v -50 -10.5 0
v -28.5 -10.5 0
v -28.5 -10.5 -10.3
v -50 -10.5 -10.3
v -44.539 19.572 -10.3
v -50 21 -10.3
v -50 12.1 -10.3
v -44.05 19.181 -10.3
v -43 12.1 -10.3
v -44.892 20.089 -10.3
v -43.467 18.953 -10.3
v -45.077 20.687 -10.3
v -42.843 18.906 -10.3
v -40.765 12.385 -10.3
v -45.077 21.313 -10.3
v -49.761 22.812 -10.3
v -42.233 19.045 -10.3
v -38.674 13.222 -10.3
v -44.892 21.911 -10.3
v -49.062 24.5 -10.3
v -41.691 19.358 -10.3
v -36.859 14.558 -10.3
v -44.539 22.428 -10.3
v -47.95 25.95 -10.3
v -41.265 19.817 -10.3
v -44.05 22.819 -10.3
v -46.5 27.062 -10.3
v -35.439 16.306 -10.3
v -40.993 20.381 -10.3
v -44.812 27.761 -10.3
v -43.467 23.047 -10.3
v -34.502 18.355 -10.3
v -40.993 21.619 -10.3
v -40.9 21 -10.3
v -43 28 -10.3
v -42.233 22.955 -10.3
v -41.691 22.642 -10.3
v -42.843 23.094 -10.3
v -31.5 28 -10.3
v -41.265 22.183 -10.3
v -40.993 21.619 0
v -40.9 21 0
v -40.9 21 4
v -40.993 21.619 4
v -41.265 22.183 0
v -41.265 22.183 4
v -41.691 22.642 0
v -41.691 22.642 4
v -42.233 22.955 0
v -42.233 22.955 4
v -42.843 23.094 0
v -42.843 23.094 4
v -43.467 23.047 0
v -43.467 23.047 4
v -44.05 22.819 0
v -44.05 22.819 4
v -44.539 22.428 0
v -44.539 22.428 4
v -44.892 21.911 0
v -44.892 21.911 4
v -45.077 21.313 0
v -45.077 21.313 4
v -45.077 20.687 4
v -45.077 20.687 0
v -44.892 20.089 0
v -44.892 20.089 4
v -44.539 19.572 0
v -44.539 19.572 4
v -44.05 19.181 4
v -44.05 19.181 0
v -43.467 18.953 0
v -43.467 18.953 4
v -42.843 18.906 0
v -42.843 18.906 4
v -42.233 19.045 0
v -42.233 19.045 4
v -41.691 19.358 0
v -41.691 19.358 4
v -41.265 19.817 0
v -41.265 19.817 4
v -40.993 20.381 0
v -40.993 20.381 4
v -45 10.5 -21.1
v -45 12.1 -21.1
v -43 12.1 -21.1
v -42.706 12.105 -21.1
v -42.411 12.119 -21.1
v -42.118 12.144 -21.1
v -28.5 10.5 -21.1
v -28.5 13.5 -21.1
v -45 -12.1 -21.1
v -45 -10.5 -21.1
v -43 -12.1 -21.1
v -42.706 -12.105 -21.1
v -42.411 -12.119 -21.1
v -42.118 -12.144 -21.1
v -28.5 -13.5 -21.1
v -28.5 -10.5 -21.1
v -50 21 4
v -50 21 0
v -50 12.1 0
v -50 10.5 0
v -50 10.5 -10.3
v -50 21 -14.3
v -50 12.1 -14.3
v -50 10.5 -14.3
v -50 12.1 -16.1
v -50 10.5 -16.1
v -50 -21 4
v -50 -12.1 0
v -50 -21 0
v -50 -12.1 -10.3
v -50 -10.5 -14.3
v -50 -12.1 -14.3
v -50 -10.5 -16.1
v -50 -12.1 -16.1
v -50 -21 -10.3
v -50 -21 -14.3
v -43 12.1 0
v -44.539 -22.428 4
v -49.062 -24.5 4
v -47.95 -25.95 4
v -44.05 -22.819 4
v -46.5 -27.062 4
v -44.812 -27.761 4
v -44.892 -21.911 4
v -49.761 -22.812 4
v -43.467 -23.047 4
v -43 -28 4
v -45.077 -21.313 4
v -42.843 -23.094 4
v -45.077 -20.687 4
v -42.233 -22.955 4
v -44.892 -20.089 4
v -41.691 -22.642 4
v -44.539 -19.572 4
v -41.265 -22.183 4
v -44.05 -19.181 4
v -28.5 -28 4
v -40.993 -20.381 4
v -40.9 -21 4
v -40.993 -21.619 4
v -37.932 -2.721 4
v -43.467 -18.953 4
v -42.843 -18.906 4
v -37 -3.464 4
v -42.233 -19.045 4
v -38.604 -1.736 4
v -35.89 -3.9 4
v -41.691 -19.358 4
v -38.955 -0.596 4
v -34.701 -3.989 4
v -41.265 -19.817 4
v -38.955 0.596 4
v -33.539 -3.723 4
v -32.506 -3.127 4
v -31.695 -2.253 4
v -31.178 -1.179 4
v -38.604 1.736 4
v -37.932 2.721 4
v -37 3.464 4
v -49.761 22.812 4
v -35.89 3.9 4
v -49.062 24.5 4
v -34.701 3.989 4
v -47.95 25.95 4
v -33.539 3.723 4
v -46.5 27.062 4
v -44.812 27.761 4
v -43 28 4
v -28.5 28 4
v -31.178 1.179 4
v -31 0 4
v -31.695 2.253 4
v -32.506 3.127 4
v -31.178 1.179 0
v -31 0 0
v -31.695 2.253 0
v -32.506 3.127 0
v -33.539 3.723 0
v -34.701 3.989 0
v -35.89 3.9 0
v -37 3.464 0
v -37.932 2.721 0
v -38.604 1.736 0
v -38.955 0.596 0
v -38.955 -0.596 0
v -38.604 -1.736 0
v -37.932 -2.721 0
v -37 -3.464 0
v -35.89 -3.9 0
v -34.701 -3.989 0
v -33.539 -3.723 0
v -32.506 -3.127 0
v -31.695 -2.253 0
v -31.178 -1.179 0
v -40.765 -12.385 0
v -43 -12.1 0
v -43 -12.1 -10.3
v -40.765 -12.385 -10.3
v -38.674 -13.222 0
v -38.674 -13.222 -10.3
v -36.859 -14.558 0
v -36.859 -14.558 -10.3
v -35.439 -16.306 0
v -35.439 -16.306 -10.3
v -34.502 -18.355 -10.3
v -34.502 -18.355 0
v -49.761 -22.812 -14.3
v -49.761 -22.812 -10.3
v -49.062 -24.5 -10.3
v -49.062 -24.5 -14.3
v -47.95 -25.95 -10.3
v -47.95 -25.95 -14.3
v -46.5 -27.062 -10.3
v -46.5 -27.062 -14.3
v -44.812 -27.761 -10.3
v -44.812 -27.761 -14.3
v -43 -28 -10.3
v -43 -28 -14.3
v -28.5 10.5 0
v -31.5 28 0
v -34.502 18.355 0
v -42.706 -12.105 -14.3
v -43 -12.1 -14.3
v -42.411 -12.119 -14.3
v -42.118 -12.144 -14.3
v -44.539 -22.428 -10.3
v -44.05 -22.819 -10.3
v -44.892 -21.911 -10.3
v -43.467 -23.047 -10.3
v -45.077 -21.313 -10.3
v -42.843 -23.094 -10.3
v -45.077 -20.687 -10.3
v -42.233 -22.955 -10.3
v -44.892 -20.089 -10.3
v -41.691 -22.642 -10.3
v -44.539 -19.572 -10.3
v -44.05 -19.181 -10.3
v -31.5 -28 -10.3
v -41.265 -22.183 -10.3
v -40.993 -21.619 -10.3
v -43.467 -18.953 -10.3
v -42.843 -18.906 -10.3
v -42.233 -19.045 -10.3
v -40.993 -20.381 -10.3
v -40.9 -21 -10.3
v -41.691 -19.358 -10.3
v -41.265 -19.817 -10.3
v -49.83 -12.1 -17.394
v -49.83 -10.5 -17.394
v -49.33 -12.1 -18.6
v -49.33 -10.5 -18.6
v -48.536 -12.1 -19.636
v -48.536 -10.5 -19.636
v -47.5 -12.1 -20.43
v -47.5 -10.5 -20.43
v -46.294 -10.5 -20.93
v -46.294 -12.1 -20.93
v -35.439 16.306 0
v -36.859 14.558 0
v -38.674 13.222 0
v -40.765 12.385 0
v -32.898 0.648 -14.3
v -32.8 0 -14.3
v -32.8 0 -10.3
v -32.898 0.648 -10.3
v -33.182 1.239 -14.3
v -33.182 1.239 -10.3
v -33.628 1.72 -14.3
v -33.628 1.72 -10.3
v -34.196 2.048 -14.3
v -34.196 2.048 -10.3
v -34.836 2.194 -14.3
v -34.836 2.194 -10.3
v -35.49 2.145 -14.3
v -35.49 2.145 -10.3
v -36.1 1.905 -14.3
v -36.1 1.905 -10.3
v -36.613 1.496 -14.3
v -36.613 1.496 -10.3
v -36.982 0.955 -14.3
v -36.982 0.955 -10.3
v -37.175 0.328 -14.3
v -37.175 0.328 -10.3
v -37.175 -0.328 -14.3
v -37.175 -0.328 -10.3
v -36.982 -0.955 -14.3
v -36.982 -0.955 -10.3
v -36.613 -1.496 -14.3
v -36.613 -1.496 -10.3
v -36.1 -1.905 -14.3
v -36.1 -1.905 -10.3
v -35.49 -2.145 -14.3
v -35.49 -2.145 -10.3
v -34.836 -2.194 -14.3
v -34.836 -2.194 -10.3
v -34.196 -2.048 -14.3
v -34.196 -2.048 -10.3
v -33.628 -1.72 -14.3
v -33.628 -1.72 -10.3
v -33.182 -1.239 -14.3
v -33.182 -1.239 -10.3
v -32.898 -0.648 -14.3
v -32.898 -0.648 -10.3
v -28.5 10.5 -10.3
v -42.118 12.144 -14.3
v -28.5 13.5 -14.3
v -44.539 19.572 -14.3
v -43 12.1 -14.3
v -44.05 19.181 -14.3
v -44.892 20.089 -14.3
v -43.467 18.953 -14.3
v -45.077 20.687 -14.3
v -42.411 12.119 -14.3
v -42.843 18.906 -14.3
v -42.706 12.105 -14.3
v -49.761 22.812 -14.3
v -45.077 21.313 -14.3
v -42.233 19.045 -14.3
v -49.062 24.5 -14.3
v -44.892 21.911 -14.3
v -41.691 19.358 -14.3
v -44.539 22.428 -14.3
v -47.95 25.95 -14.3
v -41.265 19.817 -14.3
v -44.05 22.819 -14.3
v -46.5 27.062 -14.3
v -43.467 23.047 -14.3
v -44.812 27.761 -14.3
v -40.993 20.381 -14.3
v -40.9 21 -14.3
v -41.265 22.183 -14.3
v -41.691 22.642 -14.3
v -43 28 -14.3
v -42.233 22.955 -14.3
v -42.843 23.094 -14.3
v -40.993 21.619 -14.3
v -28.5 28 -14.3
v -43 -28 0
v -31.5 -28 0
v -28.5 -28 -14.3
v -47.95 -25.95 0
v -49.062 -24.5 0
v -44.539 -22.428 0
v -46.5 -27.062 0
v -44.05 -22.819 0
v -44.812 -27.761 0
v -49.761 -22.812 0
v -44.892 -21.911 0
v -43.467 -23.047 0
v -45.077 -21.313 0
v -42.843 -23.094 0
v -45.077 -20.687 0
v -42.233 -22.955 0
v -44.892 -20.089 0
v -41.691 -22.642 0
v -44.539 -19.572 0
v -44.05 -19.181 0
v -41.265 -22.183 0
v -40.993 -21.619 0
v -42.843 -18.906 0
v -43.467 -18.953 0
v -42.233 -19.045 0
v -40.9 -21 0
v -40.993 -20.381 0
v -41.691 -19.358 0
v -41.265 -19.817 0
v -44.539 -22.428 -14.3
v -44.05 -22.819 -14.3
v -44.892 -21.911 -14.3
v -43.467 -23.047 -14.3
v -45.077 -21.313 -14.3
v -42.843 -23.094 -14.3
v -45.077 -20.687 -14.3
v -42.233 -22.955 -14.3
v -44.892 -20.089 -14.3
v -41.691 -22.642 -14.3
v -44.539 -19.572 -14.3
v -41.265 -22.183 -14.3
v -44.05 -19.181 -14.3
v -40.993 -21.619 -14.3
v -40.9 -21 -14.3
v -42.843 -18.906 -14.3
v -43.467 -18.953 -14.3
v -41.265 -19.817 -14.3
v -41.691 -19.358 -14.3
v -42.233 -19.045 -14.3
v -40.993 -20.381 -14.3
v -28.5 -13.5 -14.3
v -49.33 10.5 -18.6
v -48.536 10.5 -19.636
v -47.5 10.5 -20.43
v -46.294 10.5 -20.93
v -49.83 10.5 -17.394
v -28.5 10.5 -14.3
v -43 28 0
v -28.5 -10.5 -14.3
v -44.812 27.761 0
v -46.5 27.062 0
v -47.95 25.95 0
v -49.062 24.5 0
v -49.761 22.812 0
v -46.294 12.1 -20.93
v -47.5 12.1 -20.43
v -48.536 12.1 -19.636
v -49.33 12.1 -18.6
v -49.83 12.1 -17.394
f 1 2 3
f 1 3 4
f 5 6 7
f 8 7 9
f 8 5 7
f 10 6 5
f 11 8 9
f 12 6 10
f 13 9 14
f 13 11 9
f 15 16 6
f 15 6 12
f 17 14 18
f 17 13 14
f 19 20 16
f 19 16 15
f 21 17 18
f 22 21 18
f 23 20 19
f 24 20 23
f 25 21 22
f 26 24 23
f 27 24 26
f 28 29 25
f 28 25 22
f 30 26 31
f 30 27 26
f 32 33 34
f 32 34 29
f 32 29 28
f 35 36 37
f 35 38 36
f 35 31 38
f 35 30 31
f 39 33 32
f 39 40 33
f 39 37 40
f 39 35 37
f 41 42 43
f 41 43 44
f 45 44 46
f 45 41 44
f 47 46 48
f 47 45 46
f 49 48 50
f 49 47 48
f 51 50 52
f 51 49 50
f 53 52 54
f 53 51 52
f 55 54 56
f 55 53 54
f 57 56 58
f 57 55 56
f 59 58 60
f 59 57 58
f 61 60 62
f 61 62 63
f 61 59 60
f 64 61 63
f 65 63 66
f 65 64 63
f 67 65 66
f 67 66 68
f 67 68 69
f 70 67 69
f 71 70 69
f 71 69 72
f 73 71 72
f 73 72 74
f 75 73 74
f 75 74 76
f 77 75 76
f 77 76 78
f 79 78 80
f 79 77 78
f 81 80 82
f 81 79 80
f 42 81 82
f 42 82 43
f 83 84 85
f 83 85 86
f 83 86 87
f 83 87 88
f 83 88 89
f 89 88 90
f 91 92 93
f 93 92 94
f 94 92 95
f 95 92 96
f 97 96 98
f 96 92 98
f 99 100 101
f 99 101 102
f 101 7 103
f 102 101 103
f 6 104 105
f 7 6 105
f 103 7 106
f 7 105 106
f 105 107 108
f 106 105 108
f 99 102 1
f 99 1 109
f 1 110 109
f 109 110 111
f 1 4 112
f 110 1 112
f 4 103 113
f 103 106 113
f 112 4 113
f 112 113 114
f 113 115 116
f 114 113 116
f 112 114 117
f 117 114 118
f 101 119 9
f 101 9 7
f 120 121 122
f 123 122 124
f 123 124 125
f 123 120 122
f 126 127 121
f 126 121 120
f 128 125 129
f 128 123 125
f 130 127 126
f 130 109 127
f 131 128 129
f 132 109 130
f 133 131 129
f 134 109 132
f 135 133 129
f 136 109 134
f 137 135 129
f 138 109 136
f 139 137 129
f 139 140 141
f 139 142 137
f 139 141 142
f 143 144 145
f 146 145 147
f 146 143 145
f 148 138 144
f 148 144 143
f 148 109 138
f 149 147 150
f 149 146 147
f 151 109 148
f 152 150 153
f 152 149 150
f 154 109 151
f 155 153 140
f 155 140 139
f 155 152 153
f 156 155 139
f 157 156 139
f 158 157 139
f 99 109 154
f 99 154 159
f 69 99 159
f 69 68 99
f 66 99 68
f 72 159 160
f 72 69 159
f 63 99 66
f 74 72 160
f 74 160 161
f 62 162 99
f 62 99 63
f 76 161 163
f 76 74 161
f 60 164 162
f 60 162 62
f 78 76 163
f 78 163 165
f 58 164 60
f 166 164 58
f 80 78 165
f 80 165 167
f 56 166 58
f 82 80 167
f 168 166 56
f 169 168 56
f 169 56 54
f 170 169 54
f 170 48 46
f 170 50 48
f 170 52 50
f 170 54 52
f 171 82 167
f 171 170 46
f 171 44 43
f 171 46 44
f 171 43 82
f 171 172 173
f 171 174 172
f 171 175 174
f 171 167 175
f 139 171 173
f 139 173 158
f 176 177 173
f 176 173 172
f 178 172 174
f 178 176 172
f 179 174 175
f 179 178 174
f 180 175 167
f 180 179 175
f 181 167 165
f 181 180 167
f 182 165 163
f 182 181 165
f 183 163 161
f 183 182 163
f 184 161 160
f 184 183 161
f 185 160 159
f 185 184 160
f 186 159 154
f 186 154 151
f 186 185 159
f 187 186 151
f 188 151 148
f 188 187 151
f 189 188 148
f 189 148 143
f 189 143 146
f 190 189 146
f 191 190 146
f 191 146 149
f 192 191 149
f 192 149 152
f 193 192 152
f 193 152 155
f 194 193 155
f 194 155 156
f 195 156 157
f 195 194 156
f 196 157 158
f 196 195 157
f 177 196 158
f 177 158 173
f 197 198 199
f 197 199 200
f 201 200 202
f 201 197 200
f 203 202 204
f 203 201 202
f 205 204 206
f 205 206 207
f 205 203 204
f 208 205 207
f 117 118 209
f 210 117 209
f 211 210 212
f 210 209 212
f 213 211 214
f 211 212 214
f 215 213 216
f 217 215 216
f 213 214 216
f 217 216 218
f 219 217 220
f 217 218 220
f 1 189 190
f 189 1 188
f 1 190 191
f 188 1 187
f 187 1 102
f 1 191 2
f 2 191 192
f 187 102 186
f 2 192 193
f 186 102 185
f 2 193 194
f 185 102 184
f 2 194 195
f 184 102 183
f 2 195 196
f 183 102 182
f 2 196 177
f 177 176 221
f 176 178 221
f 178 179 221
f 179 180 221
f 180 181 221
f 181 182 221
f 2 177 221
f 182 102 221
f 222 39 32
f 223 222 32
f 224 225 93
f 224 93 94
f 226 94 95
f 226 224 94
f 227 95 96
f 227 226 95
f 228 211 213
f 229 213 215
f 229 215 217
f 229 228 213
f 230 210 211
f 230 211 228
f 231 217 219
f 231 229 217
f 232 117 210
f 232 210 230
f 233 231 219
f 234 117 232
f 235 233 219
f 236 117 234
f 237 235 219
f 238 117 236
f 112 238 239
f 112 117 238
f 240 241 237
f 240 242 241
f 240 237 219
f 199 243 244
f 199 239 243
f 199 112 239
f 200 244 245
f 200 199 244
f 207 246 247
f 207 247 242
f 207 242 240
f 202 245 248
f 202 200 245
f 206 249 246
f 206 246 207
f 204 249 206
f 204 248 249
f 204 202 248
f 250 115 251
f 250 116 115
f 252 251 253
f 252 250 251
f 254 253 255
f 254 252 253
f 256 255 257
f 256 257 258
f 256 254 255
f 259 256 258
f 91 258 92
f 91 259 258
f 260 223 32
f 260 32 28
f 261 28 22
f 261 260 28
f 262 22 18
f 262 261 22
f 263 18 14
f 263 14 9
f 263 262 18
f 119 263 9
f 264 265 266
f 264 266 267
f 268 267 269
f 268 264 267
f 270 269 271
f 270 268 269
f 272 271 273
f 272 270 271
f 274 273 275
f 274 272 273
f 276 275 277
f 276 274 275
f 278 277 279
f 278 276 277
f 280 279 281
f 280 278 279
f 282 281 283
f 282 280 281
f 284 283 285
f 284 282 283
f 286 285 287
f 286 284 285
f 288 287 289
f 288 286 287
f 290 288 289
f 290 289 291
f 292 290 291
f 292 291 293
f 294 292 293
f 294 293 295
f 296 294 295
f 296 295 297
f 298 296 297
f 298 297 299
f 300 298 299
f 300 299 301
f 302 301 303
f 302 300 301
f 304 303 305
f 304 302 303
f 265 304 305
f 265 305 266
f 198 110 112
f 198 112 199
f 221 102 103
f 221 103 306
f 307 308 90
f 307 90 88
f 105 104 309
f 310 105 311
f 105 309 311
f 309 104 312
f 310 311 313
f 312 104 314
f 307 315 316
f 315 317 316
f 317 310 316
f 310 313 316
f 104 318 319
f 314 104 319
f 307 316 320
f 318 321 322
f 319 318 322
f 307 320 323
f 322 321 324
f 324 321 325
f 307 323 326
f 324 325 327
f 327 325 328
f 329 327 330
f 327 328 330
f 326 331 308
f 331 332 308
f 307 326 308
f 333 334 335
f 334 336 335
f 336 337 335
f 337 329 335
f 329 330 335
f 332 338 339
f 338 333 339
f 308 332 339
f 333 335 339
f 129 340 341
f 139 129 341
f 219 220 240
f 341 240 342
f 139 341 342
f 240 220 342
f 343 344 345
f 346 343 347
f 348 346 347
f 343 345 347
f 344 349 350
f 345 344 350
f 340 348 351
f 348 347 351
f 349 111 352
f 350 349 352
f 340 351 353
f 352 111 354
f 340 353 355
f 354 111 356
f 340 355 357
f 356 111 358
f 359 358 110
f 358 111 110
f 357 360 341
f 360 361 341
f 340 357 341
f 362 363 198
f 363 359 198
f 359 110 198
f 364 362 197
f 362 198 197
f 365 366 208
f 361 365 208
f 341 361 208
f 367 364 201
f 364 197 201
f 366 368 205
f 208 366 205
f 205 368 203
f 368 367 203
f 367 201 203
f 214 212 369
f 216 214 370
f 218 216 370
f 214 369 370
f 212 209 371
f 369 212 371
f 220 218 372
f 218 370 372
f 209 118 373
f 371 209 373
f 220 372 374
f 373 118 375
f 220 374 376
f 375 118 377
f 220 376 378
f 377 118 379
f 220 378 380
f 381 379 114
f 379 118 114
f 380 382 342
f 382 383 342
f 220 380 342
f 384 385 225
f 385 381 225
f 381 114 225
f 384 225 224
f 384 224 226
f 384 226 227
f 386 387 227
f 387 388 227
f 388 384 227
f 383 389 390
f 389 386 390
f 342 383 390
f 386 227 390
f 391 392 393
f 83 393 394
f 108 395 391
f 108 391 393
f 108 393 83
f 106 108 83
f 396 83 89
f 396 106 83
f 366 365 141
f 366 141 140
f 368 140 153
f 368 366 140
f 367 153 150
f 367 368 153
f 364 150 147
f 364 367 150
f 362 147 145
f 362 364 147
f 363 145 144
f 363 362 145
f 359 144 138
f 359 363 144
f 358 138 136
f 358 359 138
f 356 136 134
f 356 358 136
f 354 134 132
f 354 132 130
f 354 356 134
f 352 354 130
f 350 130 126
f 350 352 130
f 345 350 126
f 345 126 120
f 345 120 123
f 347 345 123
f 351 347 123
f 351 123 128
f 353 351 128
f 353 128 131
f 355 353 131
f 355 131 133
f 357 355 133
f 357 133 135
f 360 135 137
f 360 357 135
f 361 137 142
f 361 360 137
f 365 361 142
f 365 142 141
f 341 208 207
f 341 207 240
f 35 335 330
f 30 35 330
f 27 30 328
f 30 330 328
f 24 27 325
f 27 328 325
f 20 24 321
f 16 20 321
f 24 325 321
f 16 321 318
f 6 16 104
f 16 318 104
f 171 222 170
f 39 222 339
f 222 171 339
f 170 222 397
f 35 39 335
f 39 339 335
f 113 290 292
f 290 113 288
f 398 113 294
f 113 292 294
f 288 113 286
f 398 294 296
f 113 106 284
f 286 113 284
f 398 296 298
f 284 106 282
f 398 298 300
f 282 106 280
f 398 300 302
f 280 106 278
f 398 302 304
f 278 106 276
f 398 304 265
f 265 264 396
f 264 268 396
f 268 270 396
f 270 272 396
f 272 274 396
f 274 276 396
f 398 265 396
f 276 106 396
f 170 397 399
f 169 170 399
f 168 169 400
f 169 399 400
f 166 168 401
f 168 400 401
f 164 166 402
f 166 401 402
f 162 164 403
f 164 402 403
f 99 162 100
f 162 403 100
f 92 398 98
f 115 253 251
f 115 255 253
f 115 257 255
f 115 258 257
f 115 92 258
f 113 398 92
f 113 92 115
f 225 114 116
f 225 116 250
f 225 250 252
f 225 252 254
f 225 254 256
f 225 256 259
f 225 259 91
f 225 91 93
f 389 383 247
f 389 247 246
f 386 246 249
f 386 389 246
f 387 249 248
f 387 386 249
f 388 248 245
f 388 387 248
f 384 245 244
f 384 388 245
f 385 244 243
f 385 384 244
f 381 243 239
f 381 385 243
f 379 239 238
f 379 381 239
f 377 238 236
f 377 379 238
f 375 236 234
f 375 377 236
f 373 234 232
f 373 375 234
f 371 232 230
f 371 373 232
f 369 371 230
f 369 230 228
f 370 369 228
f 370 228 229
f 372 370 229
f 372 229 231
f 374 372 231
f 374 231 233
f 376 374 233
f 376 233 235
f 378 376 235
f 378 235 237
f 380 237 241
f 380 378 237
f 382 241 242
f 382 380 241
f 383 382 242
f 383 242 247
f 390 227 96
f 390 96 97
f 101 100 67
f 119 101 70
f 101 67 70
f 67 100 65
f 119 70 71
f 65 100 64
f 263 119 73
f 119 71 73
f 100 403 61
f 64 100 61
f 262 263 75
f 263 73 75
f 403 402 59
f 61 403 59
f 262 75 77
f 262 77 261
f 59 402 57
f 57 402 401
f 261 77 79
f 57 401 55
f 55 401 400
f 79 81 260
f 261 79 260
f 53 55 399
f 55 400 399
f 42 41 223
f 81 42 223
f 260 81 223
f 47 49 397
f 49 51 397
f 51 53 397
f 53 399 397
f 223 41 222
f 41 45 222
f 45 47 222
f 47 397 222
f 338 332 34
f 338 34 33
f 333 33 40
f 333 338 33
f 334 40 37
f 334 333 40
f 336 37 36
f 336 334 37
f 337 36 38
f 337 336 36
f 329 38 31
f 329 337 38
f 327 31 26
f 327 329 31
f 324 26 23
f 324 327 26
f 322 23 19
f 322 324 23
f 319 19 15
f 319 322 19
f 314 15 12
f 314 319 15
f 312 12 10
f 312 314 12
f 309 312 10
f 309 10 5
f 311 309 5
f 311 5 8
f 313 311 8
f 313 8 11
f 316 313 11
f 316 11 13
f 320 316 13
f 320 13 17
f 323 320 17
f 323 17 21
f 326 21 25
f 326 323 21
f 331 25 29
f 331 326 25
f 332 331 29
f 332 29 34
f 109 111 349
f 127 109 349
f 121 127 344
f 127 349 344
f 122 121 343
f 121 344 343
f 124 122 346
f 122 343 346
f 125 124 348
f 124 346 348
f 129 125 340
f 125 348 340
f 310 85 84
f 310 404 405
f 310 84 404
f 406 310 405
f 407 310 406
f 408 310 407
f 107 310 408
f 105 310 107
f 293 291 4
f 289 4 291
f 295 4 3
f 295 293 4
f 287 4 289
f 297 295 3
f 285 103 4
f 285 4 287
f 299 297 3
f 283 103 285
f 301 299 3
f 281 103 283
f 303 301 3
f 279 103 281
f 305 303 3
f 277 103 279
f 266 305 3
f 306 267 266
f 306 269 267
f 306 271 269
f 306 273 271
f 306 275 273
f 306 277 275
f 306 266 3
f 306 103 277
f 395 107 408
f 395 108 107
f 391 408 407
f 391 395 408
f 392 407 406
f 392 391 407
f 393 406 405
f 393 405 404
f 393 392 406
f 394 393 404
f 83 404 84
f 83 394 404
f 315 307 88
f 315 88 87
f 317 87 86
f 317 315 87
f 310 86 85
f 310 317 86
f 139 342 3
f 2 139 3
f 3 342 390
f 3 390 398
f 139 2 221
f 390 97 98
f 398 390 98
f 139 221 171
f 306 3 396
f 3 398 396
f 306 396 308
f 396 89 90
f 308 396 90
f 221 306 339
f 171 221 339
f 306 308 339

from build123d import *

# Parameters (mm, degrees)
SKETCH_1_R      = 2.1
SKETCH_1_R_2    = 4
EXTRUDE_1_DEPTH = 4
EXTRUDE_2_DEPTH = 10.3
EXTRUDE_START   = -14.3
SKETCH_1_6_R    = 2.1
SKETCH_1_6_R_2  = 2.2
EXTRUDE_3_DEPTH = 4
EXTRUDE_4_DEPTH = 6.8
FILLET_1_R      = 5


with BuildPart() as part:
    # 草图1 → 凸台-拉伸1 (new body)
    with BuildSketch(Plane.XY):
        with BuildLine():
            ThreePointArc((-43, 28), (-47.949747468, 25.949747468), (-50, 21))
            Line((-50, 21), (-50, -21))
            ThreePointArc((-50, -21), (-47.949747468, -25.949747468), (-43, -28))
            Line((-43, -28), (-28.5, -28))
            Line((-28.5, -28), (-28.5, 28))
            Line((-28.5, 28), (-43, 28))
        make_face()
        with Locations((-43, 21)):
            Circle(SKETCH_1_R, mode=Mode.SUBTRACT)
        with Locations((-35, 0)):
            Circle(SKETCH_1_R_2, mode=Mode.SUBTRACT)
        with Locations((-43, -21)):
            Circle(SKETCH_1_R, mode=Mode.SUBTRACT)
    extrude(amount=EXTRUDE_1_DEPTH)

    # 草图1<5> → 凸台-拉伸2 (add)
    with BuildSketch(Plane.XY):
        with BuildLine():
            Line((-43, 12.1), (-50, 12.1))
            Line((-50, 12.1), (-50, 10.5))
            Line((-50, 10.5), (-28.5, 10.5))
            Line((-28.5, 10.5), (-28.5, 28))
            Line((-28.5, 28), (-31.5, 28))
            Line((-31.5, 28), (-34.502137832, 18.354940724))
            ThreePointArc((-34.502137832, 18.354940724), (-37.724160141, 13.832328567), (-43, 12.1))
        make_face()
        with BuildLine():
            Line((-28.5, -10.5), (-50, -10.5))
            Line((-50, -10.5), (-50, -12.1))
            Line((-50, -12.1), (-43, -12.1))
            ThreePointArc((-43, -12.1), (-37.724160141, -13.832328567), (-34.502137832, -18.354940724))
            Line((-34.502137832, -18.354940724), (-31.5, -28))
            Line((-31.5, -28), (-28.5, -28))
            Line((-28.5, -28), (-28.5, -10.5))
        make_face()
    extrude(amount=-EXTRUDE_2_DEPTH)

    # 草图1<6> → 凸台-拉伸3 (add)
    with BuildSketch(Plane.XY.offset(EXTRUDE_START)):
        with BuildLine():
            ThreePointArc((-43, 28), (-47.949747468, 25.949747468), (-50, 21))
            Line((-50, 21), (-50, -21))
            ThreePointArc((-50, -21), (-47.949747468, -25.949747468), (-43, -28))
            Line((-43, -28), (-28.5, -28))
            Line((-28.5, -28), (-28.5, 28))
            Line((-28.5, 28), (-43, 28))
        make_face()
        with Locations((-43, 21)):
            Circle(SKETCH_1_6_R, mode=Mode.SUBTRACT)
        with Locations((-43, -21)):
            Circle(SKETCH_1_6_R, mode=Mode.SUBTRACT)
        with Locations((-35, 0)):
            Circle(SKETCH_1_6_R_2, mode=Mode.SUBTRACT)
    extrude(amount=EXTRUDE_3_DEPTH)

    # 草图1<7> → 凸台-拉伸4 (add)
    with BuildSketch(Plane.XY.offset(EXTRUDE_START)):
        with BuildLine():
            Line((-43, 12.1), (-50, 12.1))
            Line((-50, 12.1), (-50, 10.5))
            Line((-50, 10.5), (-28.5, 10.5))
            Line((-28.5, 10.5), (-28.5, 13.5))
            Line((-28.5, 13.5), (-42.118030123, 12.143808429))
            ThreePointArc((-42.118030123, 12.143808429), (-42.558471393, 12.110958854), (-43, 12.1))
        make_face()
        with BuildLine():
            Line((-28.5, -10.5), (-50, -10.5))
            Line((-50, -10.5), (-50, -12.1))
            Line((-50, -12.1), (-43, -12.1))
            ThreePointArc((-43, -12.1), (-42.558471393, -12.110958854), (-42.118030123, -12.143808429))
            Line((-42.118030123, -12.143808429), (-28.5, -13.5))
            Line((-28.5, -13.5), (-28.5, -10.5))
        make_face()
    extrude(amount=-EXTRUDE_4_DEPTH)

    # 圆角1
    fillet_1_edges = [part.edges().sort_by_distance(p)[0] for p in [
        (-50, 11.3, -21.1),
        (-50, -11.3, -21.1),
    ]]
    fillet(fillet_1_edges, radius=FILLET_1_R)


solid = part.part
